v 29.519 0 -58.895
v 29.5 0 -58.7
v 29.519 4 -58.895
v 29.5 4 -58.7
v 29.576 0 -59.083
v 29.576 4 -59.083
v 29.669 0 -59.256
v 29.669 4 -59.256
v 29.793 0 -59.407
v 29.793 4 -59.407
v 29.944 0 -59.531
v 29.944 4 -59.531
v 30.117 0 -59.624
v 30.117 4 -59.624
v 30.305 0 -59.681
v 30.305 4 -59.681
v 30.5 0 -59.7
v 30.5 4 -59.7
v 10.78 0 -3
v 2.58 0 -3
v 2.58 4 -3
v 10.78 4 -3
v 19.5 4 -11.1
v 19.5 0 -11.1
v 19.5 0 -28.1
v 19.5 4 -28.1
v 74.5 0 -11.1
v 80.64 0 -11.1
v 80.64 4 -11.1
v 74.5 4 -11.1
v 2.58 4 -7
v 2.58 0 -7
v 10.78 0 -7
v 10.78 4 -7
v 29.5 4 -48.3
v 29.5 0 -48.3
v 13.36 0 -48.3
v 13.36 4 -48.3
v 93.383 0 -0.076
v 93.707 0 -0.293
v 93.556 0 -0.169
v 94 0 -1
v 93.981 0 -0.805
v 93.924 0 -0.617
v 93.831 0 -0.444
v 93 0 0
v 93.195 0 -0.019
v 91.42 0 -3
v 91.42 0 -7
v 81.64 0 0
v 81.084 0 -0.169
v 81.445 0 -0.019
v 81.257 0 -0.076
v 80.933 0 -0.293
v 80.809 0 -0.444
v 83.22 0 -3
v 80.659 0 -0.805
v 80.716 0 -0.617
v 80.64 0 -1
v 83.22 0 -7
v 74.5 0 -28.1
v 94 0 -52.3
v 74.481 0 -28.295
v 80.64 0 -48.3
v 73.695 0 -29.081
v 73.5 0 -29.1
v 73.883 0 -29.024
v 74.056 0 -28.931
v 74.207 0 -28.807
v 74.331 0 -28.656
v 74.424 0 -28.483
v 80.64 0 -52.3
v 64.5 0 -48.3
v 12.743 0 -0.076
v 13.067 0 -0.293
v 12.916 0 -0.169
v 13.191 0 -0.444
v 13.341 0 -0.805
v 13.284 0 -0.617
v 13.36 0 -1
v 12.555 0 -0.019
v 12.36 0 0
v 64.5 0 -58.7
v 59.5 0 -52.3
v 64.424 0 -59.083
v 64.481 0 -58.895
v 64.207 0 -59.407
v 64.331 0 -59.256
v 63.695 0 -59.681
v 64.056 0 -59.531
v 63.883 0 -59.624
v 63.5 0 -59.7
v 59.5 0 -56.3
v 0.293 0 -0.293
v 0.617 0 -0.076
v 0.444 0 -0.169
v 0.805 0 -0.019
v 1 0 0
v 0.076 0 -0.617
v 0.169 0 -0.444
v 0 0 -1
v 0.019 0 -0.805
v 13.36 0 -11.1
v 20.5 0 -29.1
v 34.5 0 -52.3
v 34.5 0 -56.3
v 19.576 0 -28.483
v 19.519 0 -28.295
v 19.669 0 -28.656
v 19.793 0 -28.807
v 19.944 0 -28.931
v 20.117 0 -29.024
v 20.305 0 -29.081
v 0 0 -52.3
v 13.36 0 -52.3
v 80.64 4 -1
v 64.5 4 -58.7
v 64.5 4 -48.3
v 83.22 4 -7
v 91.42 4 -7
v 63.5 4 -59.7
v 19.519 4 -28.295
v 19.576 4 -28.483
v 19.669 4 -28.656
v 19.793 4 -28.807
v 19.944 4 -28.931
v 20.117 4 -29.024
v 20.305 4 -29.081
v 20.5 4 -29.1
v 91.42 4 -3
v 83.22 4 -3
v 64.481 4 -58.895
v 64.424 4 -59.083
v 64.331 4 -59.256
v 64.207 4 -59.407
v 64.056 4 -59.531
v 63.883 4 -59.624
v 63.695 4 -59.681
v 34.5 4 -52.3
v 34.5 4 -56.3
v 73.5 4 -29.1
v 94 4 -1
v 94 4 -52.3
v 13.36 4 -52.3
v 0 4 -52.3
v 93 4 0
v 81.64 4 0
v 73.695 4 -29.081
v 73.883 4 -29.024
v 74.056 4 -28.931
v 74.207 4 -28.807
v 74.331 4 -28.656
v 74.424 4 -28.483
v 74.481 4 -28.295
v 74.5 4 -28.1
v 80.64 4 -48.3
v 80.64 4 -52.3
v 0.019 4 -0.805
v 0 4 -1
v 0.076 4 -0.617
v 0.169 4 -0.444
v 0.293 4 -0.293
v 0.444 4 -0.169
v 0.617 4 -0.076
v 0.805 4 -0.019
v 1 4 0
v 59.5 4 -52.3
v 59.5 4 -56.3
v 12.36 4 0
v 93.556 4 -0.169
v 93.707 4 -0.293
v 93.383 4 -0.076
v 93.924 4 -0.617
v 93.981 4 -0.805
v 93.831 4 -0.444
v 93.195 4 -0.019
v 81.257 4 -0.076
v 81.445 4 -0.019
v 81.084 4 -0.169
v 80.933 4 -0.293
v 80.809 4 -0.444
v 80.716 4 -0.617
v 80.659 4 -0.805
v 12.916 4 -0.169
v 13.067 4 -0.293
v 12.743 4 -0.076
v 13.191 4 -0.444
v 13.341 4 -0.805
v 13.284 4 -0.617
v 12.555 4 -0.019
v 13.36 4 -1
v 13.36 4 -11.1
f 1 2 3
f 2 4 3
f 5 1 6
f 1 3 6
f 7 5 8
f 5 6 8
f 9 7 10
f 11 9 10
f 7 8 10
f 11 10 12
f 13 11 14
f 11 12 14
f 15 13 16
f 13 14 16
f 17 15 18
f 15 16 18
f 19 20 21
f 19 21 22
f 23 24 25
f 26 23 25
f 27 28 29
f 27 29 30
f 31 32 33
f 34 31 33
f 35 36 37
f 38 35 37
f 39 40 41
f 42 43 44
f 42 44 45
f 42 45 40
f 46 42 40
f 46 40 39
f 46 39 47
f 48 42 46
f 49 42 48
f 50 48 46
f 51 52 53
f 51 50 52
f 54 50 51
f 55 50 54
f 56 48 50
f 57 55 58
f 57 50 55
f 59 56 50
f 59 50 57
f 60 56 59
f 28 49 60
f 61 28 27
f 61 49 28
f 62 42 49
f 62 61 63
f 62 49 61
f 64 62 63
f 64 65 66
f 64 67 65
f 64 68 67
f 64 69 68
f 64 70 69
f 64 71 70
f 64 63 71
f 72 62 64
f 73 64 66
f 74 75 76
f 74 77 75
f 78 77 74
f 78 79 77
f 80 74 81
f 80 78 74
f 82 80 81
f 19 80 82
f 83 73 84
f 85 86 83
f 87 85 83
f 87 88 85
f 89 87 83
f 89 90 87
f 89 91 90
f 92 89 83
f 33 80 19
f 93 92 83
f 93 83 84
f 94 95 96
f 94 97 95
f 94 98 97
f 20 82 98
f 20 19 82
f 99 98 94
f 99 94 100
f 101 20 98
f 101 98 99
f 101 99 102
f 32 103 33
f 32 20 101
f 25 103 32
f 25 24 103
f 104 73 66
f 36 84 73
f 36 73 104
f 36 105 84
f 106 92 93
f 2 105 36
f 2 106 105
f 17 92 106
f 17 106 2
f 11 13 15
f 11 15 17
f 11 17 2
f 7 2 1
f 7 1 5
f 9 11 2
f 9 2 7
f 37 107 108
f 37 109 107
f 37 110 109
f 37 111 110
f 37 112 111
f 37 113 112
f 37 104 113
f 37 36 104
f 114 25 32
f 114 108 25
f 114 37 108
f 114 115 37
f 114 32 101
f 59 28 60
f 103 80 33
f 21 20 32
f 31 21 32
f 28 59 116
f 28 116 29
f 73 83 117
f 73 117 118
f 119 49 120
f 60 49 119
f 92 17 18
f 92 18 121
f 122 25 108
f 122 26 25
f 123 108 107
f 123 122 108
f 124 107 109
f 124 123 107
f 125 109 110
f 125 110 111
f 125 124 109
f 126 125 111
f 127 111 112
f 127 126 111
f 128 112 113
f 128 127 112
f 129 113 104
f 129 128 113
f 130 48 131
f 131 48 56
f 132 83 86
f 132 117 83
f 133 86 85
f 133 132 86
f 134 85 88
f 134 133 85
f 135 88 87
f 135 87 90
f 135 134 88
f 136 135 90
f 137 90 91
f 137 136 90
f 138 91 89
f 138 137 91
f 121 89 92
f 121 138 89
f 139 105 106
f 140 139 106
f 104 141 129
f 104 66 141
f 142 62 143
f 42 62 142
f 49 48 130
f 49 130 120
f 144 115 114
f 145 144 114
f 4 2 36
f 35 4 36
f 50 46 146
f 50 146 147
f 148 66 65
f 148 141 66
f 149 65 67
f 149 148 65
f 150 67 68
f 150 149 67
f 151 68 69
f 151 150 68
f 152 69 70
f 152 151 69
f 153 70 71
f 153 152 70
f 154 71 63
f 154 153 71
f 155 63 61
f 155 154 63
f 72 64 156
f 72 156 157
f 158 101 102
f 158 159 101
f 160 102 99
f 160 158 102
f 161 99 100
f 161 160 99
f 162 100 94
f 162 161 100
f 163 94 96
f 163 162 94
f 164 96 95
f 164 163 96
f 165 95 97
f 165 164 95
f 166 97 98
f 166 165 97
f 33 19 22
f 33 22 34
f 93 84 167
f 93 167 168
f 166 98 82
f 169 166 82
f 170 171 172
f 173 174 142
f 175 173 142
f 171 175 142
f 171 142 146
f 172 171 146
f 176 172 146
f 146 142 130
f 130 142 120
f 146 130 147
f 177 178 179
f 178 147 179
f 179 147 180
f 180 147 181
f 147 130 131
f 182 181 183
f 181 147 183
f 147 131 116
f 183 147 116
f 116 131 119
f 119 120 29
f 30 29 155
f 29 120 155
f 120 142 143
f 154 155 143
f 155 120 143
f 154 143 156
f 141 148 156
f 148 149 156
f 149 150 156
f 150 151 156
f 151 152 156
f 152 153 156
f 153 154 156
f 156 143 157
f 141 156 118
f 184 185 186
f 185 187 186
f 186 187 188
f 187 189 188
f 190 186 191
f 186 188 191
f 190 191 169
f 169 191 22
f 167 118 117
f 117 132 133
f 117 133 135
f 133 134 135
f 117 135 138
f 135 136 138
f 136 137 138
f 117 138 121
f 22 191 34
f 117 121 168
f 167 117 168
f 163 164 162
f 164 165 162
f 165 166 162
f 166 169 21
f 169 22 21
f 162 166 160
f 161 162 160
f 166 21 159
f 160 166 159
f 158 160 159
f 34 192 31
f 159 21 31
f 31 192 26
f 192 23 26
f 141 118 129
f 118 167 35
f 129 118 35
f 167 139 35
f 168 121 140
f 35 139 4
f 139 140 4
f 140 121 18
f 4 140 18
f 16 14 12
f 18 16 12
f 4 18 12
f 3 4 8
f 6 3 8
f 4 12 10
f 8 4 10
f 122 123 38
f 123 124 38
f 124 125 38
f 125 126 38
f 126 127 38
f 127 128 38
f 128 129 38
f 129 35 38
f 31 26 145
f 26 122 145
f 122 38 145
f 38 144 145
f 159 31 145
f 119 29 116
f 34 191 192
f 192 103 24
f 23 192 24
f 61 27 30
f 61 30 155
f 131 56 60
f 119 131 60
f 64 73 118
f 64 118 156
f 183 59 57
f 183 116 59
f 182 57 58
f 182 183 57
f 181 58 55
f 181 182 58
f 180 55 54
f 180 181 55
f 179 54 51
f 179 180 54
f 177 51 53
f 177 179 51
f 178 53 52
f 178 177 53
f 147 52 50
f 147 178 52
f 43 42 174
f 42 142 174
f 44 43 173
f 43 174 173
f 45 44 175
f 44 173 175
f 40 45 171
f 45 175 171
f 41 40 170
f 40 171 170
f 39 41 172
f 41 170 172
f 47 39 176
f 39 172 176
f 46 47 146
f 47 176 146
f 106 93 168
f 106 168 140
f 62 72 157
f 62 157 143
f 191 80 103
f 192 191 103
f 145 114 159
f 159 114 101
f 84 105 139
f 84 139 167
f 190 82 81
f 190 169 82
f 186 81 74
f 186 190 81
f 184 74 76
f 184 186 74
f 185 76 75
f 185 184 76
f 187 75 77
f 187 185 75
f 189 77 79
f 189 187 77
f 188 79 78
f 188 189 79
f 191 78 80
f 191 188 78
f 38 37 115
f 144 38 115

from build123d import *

# Parameters (mm, degrees)
SKETCH1_W            = 8.2
SKETCH1_H            = 4
BOSS_EXTRUDE1_DEPTH  = 4
FILLET1_R            = 1
FILLET1_OF_MIRROR1_R = 1


with BuildPart() as part:
    # Sketch1 → Boss-Extrude1 (new body)
    with BuildSketch(Plane(origin=(0, 0, 0), x_dir=(1, 0, 0), z_dir=(0, 1, 0))):
        Polygon((0, 52.3), (0, 0), (13.36, 0), (13.36, 11.1), (19.5, 11.1), (19.5, 29.1), (47, 29.1), (47, 52.3), (34.5, 52.3), (34.5, 56.3), (47, 56.3), (47, 59.7), (29.5, 59.7), (29.5, 48.3), (13.36, 48.3), (13.36, 52.3), align=None)
        with Locations((6.68, 5)):
            Rectangle(SKETCH1_W, SKETCH1_H, mode=Mode.SUBTRACT)
    boss_extrude1 = extrude(amount=BOSS_EXTRUDE1_DEPTH)

    # Fillet1
    fillet1_edges = [part.edges().sort_by_distance(p)[0] for p in [
        (19.5, 2, -29.1),
        (13.36, 2, 0),
        (0, 2, 0),
        (29.5, 2, -59.7),
    ]]
    fillet(fillet1_edges, radius=FILLET1_R)

    # Mirror1: Boss-Extrude1 across plane
    add(boss_extrude1.mirror(Plane(origin=(47, 4, 0), x_dir=(0, 0, 1), z_dir=(1, 0, 0))))

    # Fillet1 of Mirror1
    fillet1_of_mirror1_edges = [part.edges().sort_by_distance(p)[0] for p in [
        (74.5, 2, -29.1),
        (80.64, 2, 0),
        (94, 2, 0),
        (64.5, 2, -59.7),
    ]]
    fillet(fillet1_of_mirror1_edges, radius=FILLET1_OF_MIRROR1_R)


solid = part.part
